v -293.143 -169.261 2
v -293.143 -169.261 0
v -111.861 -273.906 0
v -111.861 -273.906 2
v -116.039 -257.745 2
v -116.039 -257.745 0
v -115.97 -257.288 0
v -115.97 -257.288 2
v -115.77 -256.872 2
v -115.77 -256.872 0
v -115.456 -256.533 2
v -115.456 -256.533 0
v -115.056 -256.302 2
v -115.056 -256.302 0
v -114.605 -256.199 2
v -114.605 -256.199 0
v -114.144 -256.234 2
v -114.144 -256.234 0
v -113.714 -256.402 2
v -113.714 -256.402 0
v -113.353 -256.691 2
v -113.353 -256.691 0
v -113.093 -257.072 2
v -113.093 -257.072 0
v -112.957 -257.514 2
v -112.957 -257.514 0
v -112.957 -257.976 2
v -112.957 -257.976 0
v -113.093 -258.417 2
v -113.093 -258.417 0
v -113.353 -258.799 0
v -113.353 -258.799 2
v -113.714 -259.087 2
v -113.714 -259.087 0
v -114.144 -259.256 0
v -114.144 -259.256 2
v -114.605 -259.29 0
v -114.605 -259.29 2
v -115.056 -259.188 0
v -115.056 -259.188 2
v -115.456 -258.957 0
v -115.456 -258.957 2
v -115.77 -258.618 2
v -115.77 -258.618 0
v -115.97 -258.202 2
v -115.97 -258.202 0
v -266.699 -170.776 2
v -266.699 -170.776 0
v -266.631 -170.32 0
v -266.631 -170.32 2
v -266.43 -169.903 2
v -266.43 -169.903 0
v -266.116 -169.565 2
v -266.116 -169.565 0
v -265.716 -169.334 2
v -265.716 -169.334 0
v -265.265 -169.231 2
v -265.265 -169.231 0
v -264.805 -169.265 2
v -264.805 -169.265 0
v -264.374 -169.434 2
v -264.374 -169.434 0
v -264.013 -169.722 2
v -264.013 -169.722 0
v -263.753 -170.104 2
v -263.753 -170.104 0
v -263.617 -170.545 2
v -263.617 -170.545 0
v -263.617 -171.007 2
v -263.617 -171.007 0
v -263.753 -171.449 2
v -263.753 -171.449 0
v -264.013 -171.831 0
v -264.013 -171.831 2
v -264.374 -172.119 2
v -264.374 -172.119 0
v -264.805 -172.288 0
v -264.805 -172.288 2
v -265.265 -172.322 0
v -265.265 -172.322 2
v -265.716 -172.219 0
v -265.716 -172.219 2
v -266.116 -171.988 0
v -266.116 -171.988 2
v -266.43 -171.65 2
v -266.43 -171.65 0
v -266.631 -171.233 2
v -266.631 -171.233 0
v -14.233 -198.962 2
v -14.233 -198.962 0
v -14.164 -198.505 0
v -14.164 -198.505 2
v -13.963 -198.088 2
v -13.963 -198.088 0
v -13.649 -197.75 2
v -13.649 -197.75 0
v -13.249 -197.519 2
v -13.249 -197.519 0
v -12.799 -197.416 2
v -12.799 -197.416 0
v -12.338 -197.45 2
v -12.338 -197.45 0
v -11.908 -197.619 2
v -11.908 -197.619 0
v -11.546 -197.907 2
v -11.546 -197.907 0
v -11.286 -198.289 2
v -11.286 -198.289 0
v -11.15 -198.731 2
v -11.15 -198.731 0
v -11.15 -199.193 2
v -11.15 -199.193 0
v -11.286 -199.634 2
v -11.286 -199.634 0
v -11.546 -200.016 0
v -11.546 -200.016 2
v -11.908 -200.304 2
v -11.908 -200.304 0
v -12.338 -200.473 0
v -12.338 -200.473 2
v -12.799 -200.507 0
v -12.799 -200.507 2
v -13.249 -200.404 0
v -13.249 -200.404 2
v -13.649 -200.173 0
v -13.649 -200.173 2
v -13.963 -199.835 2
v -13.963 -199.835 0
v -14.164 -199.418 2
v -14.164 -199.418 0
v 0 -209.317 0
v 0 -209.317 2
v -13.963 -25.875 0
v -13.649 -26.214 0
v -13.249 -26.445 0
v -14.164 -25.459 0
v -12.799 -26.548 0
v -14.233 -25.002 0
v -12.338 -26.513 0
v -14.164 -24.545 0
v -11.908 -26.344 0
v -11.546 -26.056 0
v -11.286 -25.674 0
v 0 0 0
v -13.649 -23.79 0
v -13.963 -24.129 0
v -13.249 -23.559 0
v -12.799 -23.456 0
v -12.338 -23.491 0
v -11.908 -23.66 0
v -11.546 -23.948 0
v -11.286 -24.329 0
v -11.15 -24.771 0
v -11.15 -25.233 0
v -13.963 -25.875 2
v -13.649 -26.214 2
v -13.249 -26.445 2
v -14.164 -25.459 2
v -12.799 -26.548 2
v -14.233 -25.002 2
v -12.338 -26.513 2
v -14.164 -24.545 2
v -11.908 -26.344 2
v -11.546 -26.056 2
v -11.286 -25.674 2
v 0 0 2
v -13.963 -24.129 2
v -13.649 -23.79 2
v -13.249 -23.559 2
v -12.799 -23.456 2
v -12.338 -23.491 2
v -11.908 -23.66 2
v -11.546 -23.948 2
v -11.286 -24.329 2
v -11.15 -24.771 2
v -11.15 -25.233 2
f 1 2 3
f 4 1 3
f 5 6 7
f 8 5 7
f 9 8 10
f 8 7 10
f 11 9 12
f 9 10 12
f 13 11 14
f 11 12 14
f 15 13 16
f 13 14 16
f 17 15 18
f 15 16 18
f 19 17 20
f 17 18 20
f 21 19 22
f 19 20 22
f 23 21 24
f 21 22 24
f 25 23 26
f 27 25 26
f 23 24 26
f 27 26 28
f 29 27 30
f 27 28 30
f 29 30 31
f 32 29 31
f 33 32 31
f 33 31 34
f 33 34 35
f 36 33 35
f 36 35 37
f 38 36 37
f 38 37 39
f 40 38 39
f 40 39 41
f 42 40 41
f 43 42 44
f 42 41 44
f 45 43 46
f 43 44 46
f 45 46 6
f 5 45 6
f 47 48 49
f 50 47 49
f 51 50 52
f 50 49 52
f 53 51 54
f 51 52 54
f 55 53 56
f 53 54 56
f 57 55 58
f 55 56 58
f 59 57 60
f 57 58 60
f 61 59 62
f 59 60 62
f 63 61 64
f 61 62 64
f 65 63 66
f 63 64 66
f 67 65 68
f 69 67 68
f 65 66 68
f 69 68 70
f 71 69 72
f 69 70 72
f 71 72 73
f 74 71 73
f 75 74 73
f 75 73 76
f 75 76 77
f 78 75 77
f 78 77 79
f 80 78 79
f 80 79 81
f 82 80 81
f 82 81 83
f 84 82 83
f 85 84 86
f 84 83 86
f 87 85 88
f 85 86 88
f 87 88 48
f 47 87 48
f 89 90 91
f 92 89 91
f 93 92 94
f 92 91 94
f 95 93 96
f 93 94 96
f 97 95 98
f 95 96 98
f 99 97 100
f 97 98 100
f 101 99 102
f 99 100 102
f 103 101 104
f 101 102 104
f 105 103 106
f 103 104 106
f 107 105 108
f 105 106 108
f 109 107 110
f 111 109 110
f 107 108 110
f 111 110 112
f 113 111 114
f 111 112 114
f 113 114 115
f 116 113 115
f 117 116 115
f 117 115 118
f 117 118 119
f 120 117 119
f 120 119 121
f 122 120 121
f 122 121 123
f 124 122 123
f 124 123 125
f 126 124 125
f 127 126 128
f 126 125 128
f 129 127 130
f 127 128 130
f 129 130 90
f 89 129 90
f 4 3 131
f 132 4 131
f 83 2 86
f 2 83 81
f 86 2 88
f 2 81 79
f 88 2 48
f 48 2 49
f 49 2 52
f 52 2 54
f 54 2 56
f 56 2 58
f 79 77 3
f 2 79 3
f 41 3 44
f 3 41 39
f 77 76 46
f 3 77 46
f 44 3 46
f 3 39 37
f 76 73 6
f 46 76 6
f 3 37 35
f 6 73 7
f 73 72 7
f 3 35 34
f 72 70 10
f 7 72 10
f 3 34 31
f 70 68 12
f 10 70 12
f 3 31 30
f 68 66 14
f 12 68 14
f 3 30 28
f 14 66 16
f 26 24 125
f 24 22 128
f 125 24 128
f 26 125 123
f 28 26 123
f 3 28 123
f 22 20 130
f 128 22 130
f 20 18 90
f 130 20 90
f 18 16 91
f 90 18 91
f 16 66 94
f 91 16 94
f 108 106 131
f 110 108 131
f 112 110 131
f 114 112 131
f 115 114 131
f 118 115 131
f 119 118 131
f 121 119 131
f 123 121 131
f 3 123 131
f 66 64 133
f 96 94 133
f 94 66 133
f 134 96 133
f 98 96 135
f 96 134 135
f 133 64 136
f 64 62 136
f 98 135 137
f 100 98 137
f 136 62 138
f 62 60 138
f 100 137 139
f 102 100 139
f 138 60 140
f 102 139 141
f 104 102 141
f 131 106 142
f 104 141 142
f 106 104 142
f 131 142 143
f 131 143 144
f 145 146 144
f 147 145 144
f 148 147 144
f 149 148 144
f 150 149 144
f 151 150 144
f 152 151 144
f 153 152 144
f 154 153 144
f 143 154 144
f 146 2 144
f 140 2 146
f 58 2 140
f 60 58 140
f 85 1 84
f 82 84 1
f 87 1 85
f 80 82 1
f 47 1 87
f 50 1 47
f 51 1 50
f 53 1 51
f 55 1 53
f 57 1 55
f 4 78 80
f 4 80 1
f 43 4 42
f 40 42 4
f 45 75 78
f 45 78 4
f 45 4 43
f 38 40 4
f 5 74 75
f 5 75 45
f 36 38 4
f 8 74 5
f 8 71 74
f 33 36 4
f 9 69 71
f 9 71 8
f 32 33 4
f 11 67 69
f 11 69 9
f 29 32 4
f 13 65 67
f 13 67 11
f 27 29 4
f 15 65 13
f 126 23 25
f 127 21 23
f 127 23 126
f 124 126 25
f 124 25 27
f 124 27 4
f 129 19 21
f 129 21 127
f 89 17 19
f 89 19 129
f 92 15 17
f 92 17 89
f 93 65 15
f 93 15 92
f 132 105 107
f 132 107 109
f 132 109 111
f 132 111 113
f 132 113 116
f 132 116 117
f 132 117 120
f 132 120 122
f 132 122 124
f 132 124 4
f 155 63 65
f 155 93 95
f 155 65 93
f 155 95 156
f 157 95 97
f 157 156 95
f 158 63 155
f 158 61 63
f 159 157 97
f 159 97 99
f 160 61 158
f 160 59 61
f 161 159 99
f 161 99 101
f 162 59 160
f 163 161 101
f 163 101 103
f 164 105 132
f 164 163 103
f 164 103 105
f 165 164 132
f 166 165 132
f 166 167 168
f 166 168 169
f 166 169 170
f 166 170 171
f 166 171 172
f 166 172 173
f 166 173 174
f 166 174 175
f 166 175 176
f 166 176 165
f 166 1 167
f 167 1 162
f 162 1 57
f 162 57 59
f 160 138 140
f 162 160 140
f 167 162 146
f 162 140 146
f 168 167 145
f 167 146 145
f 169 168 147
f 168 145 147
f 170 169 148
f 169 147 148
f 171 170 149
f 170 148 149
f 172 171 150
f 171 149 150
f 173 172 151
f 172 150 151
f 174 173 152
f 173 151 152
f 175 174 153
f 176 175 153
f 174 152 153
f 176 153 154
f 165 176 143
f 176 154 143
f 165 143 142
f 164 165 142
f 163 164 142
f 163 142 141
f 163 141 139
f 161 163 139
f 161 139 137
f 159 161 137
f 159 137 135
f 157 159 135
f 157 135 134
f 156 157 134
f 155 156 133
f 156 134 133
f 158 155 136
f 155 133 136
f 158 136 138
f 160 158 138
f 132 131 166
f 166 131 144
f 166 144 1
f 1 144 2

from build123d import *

# Parameters (mm, degrees)
EXTRUDE_1_DEPTH     = 2
SKETCH_3_R          = 1.55
CUT_EXTRUDE_1_DEPTH = 2


with BuildPart() as part:
    # Эскиз1 → Бобышка-Вытянуть1 (new body)
    with BuildSketch(Plane.XY):
        Polygon((0, 0), (-293.143158486, -169.261155122), (-111.86100446, -273.906060772), (0, -209.31740407), align=None)
    extrude(amount=EXTRUDE_1_DEPTH)

    # Эскиз3 → Вырез-Вытянуть1 (cut)
    with BuildSketch(Plane(origin=(0, 0, 0), x_dir=(-1, 0, 0), z_dir=(0, 0, -1))):
        with Locations((12.682716025, -25.001847817)):
            Circle(SKETCH_3_R)
        with Locations((12.682716025, -198.961582281)):
            Circle(SKETCH_3_R)
        with Locations((114.489281174, -257.744795592)):
            Circle(SKETCH_3_R)
        with Locations((265.149449722, -170.776394274)):
            Circle(SKETCH_3_R)
    extrude(amount=-CUT_EXTRUDE_1_DEPTH, mode=Mode.SUBTRACT)


solid = part.part
